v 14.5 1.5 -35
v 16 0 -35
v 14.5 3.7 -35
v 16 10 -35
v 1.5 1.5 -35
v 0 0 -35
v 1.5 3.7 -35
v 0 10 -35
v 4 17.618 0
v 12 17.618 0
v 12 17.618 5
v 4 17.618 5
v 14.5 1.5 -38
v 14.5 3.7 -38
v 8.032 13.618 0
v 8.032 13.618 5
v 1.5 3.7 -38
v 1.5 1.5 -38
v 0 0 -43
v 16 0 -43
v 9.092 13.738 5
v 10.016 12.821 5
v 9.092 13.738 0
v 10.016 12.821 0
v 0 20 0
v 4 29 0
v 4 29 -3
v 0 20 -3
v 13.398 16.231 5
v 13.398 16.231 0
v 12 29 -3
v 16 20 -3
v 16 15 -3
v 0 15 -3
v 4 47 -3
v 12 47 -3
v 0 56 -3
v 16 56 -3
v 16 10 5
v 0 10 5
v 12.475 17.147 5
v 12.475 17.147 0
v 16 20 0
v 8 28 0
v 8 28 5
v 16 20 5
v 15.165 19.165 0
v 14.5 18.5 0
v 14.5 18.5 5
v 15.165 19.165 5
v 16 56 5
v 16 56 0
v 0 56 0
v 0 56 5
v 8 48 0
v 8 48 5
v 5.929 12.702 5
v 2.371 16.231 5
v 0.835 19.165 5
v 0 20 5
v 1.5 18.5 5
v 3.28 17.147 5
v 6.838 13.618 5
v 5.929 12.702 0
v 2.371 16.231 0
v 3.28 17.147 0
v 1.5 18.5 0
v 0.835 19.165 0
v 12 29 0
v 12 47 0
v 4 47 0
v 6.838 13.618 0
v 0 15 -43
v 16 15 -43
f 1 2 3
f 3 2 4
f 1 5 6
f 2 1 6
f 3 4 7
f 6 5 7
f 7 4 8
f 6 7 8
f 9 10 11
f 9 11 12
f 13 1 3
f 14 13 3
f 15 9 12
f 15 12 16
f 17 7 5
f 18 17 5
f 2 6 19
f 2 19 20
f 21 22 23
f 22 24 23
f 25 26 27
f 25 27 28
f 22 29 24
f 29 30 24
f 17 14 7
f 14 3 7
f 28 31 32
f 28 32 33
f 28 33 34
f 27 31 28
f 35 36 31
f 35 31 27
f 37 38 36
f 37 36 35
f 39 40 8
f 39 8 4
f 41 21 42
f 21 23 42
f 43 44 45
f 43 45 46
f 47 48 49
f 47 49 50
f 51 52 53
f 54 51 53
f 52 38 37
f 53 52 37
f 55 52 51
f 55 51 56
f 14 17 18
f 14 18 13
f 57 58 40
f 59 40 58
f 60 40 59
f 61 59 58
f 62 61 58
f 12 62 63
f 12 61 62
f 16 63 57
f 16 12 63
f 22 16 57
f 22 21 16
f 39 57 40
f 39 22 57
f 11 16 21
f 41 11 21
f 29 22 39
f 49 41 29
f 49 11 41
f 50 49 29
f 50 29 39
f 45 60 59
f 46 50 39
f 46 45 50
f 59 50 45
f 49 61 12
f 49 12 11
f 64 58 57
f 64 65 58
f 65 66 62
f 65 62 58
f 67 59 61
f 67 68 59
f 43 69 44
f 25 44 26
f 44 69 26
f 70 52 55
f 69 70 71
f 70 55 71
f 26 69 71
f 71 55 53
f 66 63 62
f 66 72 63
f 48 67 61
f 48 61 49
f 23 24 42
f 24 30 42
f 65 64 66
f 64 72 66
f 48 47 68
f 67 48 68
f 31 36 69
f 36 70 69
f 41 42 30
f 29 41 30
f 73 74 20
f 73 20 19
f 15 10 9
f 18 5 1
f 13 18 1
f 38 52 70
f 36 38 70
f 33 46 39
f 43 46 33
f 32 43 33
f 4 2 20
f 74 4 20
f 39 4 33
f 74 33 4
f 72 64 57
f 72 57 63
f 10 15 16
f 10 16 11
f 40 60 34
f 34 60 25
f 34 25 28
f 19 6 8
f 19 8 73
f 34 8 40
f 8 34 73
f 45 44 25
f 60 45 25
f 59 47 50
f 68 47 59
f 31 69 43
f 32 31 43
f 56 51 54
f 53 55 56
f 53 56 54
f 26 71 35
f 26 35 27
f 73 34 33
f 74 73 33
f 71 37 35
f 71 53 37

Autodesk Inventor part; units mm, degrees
ref_plane "YZ Plane" through (0, 0, 0) normal (1, 0, 0) x (0, 1, 0)
ref_plane "XZ Plane" through (0, 0, 0) normal (0, 1, 0) x (-1, 0, 0)
ref_plane "XY Plane" through (0, 0, 0) normal (0, 0, 1) x (1, 0, 0)
sketch "Sketch1" plane through (0, 0, 0) normal (0, 0, 1) x (1, 0, 0)
  line L0 (0, 0) -> (0, 20)
  line L1 (0, 20) -> (16, 20)
  line L2 (16, 20) -> (16, 0)
  line L3 (16, 0) -> (0, 0)
  line L4 (8, 28) -> (0, 20)
  line L5 (8, 28) -> (16, 20)
  line L6 (0, 0) -> (0, 5)
  line L7 (0, 0) -> (0, 1.5)
  line L8 (0, 5) -> (0, 3.5)
  line L9 (1.5, 3.5) -> (1.5, 1.5)
  line L10 (1.5, 3.5) -> (14.5, 3.5)
  line L11 (14.5, 3.5) -> (14.5, 1.5)
  line L12 (14.5, 1.5) -> (1.5, 1.5)
  line L13 (14.5, 18.5) -> (15.1649, 19.1649)
  line L14 (15.1649, 19.1649) -> (0.8351, 19.1649)
  line L15 (0.8351, 19.1649) -> (1.5, 18.5)
  line L16 (1.5, 18.5) -> (14.5, 18.5)
  line L17 (12, 17.6183) -> (4, 17.6183)
  line L18 (4, 17.6183) -> (8.0319, 13.6184)
  line L19 (8.0319, 13.6184) -> (12, 17.6183)
  line L20 (12.4747, 17.1474) -> (13.3985, 16.231)
  line L21 (13.3985, 16.231) -> (10.016, 12.8213)
  line L22 (10.016, 12.8213) -> (9.0922, 13.7377)
  line L23 (9.0922, 13.7377) -> (12.4747, 17.1474)
  line L24 (6.8378, 13.6184) -> (3.2805, 17.1474)
  line L25 (3.2805, 17.1474) -> (2.3714, 16.231)
  line L26 (2.3714, 16.231) -> (5.9286, 12.702)
  line L27 (5.9286, 12.702) -> (6.8378, 13.6184)
  dimension "d0" = 20
  dimension "d1" = 16
  dimension "d3" = 5
  dimension "d7" = 1.5
  dimension "d9" = 13
extrude "Extrusion1" add sketch "Sketch1" along normal blind 5
extrude "Extrusion2" add sketch "Sketch1" along normal blind 4 contours L10 L11 L12 L9
sketch "Sketch2" plane through (0, 0, 0) normal (0, 0, -1) x (-1, 0, 0)
  line L0 (-16, 20) -> (-8, 28) projected
  line L1 (-16, 20) -> (0, 20)
  line L2 (0, 20) -> (-8, 28)
  line L3 (-16, 20) -> (-16, 56)
  line L4 (-16, 20) -> (20, 20) construction
  line L5 (-16, 56) -> (0, 56)
  line L6 (0, 56) -> (0, 20)
  line L7 (-16, 56) -> (-8, 48)
  line L8 (-16, 56) -> (-4.6863, 56) construction
  line L9 (-8, 48) -> (0, 56)
  point P0 (0, 0)
  dimension "d12" = 36
  dimension "d13" = 90
  dimension "d14" = 45
extrude "Extrusion3" add sketch "Sketch2" against normal blind 5 contours L5 L9 L7
sketch "Sketch3" plane through (0, 0, 0) normal (0, 0, -1) x (-1, 0, 0)
  line L0 (0, 56) -> (-8, 48) projected
  line L1 (-16, 0) -> (-16, 20) projected
  line L2 (0, 56) -> (-16, 56)
  line L3 (-16, 56) -> (-16, 0)
  line L4 (-16, 0) -> (0, 0)
  line L5 (0, 0) -> (0, 56)
  line L6 (-16, 20) -> (-8, 28) projected
  line L7 (-16, 20) -> (0, 20)
  line L8 (-8, 28) -> (0, 20) projected
  line L9 (-8, 28) -> (-8, 48)
  line L10 (-16, 56) -> (-8, 38)
  line L11 (0, 56) -> (-8, 38)
  line L12 (-8, 38) -> (0, 20)
  line L13 (-8, 38) -> (-16, 20)
  line L14 (-12, 47) -> (-12, 29)
  line L15 (-4, 47) -> (-4, 29)
  point P0 (0, 0)
extrude "Extrusion4" add sketch "Sketch3" along normal blind 3 contours L11 L9 L0 | L0 L9 L10 L2 | L5 L4 L1 L7 | L7 L6 L8 | L8 L9 L12 | L15 L12 L11 | L13 L14 L10 | L9 L6 L13
sketch "Sketch4" plane through (0, 0, 5) normal (0, 0, 1) x (1, 0, 0)
  line L0 (0, 0) -> (0, 20) projected
  line L1 (16, 20) -> (16, 0) projected
  line L2 (0, 0) -> (16, 0)
  line L3 (16, 0) -> (16, 10)
  line L4 (16, 10) -> (0, 10)
  line L5 (0, 10) -> (0, 0)
extrude "Extrusion5" cut sketch "Sketch4" against normal blind 10
sketch "Sketch5" plane through (0, 0, -3) normal (0, 0, -1) x (-1, 0, 0)
  line L0 (0, 10) -> (-16, 10) projected
  line L1 (0, 10) -> (0, 20) projected
  line L2 (-16, 10) -> (0, 10)
  line L3 (0, 10) -> (0, 15)
  line L4 (0, 15) -> (-16, 15)
  line L5 (-16, 15) -> (-16, 10)
  point P0 (0, 0)
  dimension "d21" = 5
extrude "Extrusion6" add sketch "Sketch5" along normal blind 40
sketch "Sketch6" plane through (0, 10, 5) normal (0, -1, 0) x (1, 0, 0)
  line L0 (16, -48) -> (0, -48) projected
  line L1 (16, 0) -> (16, -48) projected
  line L2 (0, -48) -> (16, -48)
  line L3 (16, -48) -> (16, -40)
  line L4 (16, -40) -> (0, -40)
  line L5 (0, -40) -> (0, -48)
  point P0 (0, -5)
  dimension "d24" = 8
extrude "Extrusion7" add sketch "Sketch6" along normal blind 10
sketch "Sketch7" plane through (0, 10, -35) normal (0, 0, 1) x (1, 0, 0)
  line L0 (0, -10) -> (16, -10)
  line L1 (16, -10) -> (16, -5)
  line L2 (16, -5) -> (0, -5)
  line L3 (0, -5) -> (0, -10)
  line L4 (0, -10) -> (1.5, -10)
  line L5 (1.5, -10) -> (1.5, -8.5)
  line L6 (1.5, -8.5) -> (0, -8.5)
  line L7 (0, -8.5) -> (0, -10)
  line L8 (1.5, -8.5) -> (14.5, -8.5)
  line L9 (14.5, -8.5) -> (14.5, -6.3)
  line L10 (14.5, -6.3) -> (1.5, -6.3)
  line L11 (1.5, -6.3) -> (1.5, -8.5)
  dimension "d27" = 16
  dimension "d28" = 5
  dimension "d29" = 1.5
  dimension "d30" = 1.5
  dimension "d31" = 13
  dimension "d32" = 2.2
extrude "Extrusion8" cut sketch "Sketch7" against normal blind 3 contours L11 L10 L9 L8
properties part number "Connecting pt.2"
